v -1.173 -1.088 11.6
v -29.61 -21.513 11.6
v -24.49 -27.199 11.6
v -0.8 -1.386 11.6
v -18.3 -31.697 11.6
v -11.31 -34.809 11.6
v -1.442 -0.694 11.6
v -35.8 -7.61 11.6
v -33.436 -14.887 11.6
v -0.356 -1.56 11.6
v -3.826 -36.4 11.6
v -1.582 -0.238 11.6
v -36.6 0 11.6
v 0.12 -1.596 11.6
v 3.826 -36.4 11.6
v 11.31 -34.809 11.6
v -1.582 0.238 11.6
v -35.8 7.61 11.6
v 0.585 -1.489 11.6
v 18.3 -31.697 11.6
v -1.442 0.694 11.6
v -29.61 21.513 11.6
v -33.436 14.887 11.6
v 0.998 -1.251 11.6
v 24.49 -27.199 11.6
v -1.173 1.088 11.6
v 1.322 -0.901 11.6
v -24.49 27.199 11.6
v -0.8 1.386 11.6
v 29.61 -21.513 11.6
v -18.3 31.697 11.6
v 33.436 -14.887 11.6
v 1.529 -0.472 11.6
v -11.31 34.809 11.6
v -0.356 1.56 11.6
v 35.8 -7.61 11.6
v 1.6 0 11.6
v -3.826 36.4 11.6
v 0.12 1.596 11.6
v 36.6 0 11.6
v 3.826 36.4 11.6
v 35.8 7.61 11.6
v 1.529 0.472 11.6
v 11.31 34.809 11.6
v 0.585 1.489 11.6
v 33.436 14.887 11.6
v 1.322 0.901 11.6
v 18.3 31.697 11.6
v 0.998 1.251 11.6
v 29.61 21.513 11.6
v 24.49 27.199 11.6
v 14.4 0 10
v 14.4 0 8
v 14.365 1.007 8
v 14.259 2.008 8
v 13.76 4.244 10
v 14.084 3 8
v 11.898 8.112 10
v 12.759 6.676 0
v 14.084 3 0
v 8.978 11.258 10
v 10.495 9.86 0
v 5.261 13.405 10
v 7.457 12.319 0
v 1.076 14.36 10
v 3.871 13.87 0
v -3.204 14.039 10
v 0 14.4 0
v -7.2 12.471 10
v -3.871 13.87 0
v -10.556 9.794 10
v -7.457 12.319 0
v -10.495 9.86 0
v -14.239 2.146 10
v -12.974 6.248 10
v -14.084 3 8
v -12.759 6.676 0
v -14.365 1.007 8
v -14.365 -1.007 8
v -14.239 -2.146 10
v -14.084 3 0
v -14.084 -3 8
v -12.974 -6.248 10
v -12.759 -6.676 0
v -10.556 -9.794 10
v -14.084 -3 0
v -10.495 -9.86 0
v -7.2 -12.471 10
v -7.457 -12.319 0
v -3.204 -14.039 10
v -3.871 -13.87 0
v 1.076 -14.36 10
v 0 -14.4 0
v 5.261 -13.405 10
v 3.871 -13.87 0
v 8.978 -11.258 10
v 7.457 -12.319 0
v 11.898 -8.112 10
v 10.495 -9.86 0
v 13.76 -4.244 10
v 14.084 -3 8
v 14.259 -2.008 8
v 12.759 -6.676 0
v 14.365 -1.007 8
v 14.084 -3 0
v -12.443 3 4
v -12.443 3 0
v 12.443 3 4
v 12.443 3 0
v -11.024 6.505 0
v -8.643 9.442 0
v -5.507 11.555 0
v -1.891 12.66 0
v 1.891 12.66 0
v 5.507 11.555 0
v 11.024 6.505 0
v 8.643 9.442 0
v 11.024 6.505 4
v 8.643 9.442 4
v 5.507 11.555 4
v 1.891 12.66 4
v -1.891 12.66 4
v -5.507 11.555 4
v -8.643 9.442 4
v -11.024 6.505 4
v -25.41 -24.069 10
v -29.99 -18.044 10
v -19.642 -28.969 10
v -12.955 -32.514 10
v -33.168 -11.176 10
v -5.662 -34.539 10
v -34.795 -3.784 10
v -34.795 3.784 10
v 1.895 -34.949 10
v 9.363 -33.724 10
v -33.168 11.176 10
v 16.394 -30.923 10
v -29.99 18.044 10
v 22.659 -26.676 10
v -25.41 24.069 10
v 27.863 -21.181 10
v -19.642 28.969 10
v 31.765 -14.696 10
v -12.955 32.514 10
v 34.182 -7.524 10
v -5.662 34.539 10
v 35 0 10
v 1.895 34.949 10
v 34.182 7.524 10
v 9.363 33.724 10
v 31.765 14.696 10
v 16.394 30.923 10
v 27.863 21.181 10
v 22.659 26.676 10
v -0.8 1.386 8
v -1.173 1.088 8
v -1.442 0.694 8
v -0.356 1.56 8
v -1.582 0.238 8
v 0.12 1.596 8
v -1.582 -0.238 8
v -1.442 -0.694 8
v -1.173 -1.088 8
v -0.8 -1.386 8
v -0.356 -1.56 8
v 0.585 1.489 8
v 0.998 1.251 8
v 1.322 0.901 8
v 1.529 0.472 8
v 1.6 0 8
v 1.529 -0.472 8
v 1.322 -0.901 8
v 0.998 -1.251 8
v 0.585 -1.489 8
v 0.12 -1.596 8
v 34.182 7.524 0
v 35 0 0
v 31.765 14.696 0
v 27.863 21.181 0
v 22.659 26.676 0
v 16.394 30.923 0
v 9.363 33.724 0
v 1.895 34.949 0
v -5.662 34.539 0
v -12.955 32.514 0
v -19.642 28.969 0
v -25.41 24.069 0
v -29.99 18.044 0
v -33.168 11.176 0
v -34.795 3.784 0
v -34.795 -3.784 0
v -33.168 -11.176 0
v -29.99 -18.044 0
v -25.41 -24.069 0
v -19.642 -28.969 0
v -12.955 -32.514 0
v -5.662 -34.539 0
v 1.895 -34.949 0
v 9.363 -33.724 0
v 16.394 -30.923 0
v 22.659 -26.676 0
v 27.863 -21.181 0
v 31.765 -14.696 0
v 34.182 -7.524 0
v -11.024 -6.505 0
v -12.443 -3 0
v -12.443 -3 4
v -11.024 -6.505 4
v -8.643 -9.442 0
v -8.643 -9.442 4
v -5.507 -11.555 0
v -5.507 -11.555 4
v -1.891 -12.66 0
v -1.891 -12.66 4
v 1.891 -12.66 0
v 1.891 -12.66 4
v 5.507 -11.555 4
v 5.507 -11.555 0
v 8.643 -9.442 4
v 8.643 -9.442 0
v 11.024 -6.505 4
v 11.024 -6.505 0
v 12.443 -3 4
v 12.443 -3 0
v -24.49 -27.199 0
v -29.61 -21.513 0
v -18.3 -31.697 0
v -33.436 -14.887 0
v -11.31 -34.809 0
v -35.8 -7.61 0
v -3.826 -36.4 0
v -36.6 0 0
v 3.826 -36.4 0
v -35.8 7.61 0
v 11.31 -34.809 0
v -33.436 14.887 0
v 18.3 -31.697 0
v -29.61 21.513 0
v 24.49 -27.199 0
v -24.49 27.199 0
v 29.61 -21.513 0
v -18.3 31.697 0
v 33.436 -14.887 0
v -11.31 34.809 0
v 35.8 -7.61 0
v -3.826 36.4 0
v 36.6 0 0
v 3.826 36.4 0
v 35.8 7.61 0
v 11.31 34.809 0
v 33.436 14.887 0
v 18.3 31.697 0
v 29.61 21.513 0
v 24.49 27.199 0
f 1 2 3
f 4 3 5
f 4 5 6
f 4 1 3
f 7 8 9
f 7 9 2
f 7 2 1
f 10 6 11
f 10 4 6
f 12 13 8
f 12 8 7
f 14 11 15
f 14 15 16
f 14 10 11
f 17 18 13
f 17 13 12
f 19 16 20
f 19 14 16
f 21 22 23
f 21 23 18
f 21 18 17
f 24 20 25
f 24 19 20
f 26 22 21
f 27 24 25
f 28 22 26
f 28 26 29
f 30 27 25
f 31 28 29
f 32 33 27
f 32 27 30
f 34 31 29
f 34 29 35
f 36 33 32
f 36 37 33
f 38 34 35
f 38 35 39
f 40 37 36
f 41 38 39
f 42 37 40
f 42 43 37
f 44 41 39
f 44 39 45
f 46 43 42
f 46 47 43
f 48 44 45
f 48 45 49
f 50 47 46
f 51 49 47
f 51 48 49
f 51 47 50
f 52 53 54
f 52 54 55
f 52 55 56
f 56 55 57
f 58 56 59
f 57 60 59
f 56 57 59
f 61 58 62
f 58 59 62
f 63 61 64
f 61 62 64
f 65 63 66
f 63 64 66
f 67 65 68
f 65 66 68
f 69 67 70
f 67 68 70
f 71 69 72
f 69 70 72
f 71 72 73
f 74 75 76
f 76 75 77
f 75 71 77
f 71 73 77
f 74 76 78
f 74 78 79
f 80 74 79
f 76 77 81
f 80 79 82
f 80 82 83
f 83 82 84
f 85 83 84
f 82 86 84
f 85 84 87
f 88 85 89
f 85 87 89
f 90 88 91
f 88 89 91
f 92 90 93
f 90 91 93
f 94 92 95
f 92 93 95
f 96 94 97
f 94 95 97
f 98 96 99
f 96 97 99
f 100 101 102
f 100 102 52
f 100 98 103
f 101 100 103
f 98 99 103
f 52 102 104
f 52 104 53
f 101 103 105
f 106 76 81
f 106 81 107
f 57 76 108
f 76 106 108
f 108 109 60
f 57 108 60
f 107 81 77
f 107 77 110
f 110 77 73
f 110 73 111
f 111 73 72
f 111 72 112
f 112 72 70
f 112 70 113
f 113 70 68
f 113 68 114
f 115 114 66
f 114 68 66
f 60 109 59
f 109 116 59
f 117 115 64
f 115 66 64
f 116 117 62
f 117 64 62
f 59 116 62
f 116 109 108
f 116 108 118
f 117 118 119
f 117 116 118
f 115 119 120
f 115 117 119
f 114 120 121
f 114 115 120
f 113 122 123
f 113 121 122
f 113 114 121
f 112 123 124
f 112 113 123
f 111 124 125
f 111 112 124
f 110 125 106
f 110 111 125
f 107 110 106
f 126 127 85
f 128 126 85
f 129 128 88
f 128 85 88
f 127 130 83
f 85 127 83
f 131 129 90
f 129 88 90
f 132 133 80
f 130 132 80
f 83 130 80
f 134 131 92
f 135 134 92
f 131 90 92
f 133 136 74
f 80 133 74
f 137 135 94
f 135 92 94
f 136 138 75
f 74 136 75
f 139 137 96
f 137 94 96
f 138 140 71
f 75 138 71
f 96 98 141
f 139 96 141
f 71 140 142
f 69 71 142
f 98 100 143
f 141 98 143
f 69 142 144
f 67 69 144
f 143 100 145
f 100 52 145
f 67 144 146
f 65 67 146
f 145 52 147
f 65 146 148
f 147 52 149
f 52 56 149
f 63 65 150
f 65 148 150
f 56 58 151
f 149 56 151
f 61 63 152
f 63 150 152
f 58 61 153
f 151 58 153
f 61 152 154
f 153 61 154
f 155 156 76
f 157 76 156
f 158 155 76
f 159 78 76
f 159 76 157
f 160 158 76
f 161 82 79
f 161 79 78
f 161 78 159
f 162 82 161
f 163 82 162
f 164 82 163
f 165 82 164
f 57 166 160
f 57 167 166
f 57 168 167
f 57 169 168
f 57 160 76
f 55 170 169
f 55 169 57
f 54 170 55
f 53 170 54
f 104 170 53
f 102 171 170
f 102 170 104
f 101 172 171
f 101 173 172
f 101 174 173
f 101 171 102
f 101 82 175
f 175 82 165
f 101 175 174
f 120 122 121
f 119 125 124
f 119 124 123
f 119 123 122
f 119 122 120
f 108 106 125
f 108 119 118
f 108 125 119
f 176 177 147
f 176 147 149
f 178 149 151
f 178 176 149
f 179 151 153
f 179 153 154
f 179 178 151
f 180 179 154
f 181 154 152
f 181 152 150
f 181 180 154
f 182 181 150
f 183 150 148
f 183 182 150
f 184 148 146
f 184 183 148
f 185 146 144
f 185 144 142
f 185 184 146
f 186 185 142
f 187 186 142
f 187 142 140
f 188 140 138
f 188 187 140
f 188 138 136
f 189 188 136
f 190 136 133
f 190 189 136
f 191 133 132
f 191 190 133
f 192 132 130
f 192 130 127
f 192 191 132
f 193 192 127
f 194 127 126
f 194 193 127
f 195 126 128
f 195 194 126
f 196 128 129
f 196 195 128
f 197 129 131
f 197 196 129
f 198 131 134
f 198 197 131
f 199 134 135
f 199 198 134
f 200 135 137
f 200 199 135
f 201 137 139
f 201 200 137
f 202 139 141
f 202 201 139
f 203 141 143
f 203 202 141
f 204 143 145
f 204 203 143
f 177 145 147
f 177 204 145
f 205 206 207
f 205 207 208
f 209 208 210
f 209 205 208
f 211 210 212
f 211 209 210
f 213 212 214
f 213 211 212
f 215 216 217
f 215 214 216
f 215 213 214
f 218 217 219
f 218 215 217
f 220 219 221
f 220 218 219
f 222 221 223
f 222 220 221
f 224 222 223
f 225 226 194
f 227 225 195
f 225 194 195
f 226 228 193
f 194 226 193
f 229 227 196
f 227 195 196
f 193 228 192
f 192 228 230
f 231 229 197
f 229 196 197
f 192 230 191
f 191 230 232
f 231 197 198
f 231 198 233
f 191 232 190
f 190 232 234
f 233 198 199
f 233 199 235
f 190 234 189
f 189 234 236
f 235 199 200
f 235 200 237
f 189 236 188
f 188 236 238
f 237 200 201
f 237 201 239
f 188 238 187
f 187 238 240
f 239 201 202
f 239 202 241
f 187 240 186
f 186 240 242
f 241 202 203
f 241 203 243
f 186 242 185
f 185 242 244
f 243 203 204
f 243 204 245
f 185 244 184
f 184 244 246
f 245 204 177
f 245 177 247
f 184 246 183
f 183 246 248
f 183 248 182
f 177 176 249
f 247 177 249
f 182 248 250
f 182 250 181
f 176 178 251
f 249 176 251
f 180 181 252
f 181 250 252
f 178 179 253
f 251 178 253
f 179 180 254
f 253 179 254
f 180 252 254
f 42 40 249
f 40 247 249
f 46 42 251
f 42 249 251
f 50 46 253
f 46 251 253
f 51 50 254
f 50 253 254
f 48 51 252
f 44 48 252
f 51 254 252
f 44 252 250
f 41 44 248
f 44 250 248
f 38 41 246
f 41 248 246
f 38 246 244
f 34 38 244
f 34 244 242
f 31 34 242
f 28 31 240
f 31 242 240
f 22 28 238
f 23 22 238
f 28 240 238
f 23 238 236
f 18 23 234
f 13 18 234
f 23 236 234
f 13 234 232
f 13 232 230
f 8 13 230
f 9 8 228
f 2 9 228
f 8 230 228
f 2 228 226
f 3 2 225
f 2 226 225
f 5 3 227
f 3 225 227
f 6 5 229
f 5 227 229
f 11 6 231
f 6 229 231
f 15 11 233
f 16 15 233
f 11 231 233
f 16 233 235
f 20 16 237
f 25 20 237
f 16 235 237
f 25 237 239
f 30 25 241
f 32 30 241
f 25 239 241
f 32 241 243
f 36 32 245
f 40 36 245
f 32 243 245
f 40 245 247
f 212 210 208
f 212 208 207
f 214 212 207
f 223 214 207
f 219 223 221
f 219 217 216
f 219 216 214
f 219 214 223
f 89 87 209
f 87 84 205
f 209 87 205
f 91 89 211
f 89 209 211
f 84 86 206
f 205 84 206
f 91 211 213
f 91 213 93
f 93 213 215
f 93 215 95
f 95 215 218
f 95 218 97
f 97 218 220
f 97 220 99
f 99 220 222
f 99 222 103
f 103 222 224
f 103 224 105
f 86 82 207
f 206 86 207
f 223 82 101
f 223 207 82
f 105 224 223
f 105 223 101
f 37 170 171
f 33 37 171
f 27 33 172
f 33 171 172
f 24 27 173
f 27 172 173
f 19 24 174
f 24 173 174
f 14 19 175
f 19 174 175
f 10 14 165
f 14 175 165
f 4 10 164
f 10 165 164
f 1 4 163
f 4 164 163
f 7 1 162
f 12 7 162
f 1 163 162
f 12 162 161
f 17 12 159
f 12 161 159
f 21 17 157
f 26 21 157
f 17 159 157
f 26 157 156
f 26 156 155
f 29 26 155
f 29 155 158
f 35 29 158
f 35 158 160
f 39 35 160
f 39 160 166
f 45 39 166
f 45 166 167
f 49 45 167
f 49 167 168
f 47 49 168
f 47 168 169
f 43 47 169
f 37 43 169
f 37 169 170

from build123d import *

# Parameters (mm, degrees)
F0_R     = 36.6
F0_R_2   = 35
F0_R_3   = 14.4
F0_R_4   = 12.8
F1_DEPTH = 10
F2_R     = 36.6
F3_DEPTH = 1.6
F4_R     = 12.8
F5_DEPTH = 6
F6_W     = 40.892508
F6_H     = 6
F7_DEPTH = 8
F8_R     = 1.6
F9_DEPTH = 25


with BuildPart() as f1:
    # F0 (on Top) → F1 (new body)
    with BuildSketch(Plane.XY):
        Circle(F0_R)
        Circle(F0_R_2, mode=Mode.SUBTRACT)
        Circle(F0_R_3)
        Circle(F0_R_4, mode=Mode.SUBTRACT)
    extrude(amount=F1_DEPTH)

    # F2 (on face) → F3 (join)
    with BuildSketch(Plane.XY.offset(10)):
        Circle(F2_R)
    extrude(amount=F3_DEPTH)

    # F4 (on face) → F5 (join)
    with BuildSketch(Plane(origin=(0, 0, 10), x_dir=(1, 0, 0), z_dir=(0, 0, -1))):
        Circle(F4_R)
    extrude(amount=F5_DEPTH)

    # F6 (on face) → F7 (cut)
    with BuildSketch(Plane(origin=(0, 0, 0), x_dir=(1, 0, 0), z_dir=(0, 0, -1))):
        Rectangle(F6_W, F6_H)
    extrude(amount=-F7_DEPTH, mode=Mode.SUBTRACT)

    # F8 (on face) → F9 (cut)
    with BuildSketch(Plane(origin=(0, 0, 8), x_dir=(1, 0, 0), z_dir=(0, 0, -1))):
        Circle(F8_R)
    extrude(amount=-F9_DEPTH, mode=Mode.SUBTRACT)


solid = f1.part
